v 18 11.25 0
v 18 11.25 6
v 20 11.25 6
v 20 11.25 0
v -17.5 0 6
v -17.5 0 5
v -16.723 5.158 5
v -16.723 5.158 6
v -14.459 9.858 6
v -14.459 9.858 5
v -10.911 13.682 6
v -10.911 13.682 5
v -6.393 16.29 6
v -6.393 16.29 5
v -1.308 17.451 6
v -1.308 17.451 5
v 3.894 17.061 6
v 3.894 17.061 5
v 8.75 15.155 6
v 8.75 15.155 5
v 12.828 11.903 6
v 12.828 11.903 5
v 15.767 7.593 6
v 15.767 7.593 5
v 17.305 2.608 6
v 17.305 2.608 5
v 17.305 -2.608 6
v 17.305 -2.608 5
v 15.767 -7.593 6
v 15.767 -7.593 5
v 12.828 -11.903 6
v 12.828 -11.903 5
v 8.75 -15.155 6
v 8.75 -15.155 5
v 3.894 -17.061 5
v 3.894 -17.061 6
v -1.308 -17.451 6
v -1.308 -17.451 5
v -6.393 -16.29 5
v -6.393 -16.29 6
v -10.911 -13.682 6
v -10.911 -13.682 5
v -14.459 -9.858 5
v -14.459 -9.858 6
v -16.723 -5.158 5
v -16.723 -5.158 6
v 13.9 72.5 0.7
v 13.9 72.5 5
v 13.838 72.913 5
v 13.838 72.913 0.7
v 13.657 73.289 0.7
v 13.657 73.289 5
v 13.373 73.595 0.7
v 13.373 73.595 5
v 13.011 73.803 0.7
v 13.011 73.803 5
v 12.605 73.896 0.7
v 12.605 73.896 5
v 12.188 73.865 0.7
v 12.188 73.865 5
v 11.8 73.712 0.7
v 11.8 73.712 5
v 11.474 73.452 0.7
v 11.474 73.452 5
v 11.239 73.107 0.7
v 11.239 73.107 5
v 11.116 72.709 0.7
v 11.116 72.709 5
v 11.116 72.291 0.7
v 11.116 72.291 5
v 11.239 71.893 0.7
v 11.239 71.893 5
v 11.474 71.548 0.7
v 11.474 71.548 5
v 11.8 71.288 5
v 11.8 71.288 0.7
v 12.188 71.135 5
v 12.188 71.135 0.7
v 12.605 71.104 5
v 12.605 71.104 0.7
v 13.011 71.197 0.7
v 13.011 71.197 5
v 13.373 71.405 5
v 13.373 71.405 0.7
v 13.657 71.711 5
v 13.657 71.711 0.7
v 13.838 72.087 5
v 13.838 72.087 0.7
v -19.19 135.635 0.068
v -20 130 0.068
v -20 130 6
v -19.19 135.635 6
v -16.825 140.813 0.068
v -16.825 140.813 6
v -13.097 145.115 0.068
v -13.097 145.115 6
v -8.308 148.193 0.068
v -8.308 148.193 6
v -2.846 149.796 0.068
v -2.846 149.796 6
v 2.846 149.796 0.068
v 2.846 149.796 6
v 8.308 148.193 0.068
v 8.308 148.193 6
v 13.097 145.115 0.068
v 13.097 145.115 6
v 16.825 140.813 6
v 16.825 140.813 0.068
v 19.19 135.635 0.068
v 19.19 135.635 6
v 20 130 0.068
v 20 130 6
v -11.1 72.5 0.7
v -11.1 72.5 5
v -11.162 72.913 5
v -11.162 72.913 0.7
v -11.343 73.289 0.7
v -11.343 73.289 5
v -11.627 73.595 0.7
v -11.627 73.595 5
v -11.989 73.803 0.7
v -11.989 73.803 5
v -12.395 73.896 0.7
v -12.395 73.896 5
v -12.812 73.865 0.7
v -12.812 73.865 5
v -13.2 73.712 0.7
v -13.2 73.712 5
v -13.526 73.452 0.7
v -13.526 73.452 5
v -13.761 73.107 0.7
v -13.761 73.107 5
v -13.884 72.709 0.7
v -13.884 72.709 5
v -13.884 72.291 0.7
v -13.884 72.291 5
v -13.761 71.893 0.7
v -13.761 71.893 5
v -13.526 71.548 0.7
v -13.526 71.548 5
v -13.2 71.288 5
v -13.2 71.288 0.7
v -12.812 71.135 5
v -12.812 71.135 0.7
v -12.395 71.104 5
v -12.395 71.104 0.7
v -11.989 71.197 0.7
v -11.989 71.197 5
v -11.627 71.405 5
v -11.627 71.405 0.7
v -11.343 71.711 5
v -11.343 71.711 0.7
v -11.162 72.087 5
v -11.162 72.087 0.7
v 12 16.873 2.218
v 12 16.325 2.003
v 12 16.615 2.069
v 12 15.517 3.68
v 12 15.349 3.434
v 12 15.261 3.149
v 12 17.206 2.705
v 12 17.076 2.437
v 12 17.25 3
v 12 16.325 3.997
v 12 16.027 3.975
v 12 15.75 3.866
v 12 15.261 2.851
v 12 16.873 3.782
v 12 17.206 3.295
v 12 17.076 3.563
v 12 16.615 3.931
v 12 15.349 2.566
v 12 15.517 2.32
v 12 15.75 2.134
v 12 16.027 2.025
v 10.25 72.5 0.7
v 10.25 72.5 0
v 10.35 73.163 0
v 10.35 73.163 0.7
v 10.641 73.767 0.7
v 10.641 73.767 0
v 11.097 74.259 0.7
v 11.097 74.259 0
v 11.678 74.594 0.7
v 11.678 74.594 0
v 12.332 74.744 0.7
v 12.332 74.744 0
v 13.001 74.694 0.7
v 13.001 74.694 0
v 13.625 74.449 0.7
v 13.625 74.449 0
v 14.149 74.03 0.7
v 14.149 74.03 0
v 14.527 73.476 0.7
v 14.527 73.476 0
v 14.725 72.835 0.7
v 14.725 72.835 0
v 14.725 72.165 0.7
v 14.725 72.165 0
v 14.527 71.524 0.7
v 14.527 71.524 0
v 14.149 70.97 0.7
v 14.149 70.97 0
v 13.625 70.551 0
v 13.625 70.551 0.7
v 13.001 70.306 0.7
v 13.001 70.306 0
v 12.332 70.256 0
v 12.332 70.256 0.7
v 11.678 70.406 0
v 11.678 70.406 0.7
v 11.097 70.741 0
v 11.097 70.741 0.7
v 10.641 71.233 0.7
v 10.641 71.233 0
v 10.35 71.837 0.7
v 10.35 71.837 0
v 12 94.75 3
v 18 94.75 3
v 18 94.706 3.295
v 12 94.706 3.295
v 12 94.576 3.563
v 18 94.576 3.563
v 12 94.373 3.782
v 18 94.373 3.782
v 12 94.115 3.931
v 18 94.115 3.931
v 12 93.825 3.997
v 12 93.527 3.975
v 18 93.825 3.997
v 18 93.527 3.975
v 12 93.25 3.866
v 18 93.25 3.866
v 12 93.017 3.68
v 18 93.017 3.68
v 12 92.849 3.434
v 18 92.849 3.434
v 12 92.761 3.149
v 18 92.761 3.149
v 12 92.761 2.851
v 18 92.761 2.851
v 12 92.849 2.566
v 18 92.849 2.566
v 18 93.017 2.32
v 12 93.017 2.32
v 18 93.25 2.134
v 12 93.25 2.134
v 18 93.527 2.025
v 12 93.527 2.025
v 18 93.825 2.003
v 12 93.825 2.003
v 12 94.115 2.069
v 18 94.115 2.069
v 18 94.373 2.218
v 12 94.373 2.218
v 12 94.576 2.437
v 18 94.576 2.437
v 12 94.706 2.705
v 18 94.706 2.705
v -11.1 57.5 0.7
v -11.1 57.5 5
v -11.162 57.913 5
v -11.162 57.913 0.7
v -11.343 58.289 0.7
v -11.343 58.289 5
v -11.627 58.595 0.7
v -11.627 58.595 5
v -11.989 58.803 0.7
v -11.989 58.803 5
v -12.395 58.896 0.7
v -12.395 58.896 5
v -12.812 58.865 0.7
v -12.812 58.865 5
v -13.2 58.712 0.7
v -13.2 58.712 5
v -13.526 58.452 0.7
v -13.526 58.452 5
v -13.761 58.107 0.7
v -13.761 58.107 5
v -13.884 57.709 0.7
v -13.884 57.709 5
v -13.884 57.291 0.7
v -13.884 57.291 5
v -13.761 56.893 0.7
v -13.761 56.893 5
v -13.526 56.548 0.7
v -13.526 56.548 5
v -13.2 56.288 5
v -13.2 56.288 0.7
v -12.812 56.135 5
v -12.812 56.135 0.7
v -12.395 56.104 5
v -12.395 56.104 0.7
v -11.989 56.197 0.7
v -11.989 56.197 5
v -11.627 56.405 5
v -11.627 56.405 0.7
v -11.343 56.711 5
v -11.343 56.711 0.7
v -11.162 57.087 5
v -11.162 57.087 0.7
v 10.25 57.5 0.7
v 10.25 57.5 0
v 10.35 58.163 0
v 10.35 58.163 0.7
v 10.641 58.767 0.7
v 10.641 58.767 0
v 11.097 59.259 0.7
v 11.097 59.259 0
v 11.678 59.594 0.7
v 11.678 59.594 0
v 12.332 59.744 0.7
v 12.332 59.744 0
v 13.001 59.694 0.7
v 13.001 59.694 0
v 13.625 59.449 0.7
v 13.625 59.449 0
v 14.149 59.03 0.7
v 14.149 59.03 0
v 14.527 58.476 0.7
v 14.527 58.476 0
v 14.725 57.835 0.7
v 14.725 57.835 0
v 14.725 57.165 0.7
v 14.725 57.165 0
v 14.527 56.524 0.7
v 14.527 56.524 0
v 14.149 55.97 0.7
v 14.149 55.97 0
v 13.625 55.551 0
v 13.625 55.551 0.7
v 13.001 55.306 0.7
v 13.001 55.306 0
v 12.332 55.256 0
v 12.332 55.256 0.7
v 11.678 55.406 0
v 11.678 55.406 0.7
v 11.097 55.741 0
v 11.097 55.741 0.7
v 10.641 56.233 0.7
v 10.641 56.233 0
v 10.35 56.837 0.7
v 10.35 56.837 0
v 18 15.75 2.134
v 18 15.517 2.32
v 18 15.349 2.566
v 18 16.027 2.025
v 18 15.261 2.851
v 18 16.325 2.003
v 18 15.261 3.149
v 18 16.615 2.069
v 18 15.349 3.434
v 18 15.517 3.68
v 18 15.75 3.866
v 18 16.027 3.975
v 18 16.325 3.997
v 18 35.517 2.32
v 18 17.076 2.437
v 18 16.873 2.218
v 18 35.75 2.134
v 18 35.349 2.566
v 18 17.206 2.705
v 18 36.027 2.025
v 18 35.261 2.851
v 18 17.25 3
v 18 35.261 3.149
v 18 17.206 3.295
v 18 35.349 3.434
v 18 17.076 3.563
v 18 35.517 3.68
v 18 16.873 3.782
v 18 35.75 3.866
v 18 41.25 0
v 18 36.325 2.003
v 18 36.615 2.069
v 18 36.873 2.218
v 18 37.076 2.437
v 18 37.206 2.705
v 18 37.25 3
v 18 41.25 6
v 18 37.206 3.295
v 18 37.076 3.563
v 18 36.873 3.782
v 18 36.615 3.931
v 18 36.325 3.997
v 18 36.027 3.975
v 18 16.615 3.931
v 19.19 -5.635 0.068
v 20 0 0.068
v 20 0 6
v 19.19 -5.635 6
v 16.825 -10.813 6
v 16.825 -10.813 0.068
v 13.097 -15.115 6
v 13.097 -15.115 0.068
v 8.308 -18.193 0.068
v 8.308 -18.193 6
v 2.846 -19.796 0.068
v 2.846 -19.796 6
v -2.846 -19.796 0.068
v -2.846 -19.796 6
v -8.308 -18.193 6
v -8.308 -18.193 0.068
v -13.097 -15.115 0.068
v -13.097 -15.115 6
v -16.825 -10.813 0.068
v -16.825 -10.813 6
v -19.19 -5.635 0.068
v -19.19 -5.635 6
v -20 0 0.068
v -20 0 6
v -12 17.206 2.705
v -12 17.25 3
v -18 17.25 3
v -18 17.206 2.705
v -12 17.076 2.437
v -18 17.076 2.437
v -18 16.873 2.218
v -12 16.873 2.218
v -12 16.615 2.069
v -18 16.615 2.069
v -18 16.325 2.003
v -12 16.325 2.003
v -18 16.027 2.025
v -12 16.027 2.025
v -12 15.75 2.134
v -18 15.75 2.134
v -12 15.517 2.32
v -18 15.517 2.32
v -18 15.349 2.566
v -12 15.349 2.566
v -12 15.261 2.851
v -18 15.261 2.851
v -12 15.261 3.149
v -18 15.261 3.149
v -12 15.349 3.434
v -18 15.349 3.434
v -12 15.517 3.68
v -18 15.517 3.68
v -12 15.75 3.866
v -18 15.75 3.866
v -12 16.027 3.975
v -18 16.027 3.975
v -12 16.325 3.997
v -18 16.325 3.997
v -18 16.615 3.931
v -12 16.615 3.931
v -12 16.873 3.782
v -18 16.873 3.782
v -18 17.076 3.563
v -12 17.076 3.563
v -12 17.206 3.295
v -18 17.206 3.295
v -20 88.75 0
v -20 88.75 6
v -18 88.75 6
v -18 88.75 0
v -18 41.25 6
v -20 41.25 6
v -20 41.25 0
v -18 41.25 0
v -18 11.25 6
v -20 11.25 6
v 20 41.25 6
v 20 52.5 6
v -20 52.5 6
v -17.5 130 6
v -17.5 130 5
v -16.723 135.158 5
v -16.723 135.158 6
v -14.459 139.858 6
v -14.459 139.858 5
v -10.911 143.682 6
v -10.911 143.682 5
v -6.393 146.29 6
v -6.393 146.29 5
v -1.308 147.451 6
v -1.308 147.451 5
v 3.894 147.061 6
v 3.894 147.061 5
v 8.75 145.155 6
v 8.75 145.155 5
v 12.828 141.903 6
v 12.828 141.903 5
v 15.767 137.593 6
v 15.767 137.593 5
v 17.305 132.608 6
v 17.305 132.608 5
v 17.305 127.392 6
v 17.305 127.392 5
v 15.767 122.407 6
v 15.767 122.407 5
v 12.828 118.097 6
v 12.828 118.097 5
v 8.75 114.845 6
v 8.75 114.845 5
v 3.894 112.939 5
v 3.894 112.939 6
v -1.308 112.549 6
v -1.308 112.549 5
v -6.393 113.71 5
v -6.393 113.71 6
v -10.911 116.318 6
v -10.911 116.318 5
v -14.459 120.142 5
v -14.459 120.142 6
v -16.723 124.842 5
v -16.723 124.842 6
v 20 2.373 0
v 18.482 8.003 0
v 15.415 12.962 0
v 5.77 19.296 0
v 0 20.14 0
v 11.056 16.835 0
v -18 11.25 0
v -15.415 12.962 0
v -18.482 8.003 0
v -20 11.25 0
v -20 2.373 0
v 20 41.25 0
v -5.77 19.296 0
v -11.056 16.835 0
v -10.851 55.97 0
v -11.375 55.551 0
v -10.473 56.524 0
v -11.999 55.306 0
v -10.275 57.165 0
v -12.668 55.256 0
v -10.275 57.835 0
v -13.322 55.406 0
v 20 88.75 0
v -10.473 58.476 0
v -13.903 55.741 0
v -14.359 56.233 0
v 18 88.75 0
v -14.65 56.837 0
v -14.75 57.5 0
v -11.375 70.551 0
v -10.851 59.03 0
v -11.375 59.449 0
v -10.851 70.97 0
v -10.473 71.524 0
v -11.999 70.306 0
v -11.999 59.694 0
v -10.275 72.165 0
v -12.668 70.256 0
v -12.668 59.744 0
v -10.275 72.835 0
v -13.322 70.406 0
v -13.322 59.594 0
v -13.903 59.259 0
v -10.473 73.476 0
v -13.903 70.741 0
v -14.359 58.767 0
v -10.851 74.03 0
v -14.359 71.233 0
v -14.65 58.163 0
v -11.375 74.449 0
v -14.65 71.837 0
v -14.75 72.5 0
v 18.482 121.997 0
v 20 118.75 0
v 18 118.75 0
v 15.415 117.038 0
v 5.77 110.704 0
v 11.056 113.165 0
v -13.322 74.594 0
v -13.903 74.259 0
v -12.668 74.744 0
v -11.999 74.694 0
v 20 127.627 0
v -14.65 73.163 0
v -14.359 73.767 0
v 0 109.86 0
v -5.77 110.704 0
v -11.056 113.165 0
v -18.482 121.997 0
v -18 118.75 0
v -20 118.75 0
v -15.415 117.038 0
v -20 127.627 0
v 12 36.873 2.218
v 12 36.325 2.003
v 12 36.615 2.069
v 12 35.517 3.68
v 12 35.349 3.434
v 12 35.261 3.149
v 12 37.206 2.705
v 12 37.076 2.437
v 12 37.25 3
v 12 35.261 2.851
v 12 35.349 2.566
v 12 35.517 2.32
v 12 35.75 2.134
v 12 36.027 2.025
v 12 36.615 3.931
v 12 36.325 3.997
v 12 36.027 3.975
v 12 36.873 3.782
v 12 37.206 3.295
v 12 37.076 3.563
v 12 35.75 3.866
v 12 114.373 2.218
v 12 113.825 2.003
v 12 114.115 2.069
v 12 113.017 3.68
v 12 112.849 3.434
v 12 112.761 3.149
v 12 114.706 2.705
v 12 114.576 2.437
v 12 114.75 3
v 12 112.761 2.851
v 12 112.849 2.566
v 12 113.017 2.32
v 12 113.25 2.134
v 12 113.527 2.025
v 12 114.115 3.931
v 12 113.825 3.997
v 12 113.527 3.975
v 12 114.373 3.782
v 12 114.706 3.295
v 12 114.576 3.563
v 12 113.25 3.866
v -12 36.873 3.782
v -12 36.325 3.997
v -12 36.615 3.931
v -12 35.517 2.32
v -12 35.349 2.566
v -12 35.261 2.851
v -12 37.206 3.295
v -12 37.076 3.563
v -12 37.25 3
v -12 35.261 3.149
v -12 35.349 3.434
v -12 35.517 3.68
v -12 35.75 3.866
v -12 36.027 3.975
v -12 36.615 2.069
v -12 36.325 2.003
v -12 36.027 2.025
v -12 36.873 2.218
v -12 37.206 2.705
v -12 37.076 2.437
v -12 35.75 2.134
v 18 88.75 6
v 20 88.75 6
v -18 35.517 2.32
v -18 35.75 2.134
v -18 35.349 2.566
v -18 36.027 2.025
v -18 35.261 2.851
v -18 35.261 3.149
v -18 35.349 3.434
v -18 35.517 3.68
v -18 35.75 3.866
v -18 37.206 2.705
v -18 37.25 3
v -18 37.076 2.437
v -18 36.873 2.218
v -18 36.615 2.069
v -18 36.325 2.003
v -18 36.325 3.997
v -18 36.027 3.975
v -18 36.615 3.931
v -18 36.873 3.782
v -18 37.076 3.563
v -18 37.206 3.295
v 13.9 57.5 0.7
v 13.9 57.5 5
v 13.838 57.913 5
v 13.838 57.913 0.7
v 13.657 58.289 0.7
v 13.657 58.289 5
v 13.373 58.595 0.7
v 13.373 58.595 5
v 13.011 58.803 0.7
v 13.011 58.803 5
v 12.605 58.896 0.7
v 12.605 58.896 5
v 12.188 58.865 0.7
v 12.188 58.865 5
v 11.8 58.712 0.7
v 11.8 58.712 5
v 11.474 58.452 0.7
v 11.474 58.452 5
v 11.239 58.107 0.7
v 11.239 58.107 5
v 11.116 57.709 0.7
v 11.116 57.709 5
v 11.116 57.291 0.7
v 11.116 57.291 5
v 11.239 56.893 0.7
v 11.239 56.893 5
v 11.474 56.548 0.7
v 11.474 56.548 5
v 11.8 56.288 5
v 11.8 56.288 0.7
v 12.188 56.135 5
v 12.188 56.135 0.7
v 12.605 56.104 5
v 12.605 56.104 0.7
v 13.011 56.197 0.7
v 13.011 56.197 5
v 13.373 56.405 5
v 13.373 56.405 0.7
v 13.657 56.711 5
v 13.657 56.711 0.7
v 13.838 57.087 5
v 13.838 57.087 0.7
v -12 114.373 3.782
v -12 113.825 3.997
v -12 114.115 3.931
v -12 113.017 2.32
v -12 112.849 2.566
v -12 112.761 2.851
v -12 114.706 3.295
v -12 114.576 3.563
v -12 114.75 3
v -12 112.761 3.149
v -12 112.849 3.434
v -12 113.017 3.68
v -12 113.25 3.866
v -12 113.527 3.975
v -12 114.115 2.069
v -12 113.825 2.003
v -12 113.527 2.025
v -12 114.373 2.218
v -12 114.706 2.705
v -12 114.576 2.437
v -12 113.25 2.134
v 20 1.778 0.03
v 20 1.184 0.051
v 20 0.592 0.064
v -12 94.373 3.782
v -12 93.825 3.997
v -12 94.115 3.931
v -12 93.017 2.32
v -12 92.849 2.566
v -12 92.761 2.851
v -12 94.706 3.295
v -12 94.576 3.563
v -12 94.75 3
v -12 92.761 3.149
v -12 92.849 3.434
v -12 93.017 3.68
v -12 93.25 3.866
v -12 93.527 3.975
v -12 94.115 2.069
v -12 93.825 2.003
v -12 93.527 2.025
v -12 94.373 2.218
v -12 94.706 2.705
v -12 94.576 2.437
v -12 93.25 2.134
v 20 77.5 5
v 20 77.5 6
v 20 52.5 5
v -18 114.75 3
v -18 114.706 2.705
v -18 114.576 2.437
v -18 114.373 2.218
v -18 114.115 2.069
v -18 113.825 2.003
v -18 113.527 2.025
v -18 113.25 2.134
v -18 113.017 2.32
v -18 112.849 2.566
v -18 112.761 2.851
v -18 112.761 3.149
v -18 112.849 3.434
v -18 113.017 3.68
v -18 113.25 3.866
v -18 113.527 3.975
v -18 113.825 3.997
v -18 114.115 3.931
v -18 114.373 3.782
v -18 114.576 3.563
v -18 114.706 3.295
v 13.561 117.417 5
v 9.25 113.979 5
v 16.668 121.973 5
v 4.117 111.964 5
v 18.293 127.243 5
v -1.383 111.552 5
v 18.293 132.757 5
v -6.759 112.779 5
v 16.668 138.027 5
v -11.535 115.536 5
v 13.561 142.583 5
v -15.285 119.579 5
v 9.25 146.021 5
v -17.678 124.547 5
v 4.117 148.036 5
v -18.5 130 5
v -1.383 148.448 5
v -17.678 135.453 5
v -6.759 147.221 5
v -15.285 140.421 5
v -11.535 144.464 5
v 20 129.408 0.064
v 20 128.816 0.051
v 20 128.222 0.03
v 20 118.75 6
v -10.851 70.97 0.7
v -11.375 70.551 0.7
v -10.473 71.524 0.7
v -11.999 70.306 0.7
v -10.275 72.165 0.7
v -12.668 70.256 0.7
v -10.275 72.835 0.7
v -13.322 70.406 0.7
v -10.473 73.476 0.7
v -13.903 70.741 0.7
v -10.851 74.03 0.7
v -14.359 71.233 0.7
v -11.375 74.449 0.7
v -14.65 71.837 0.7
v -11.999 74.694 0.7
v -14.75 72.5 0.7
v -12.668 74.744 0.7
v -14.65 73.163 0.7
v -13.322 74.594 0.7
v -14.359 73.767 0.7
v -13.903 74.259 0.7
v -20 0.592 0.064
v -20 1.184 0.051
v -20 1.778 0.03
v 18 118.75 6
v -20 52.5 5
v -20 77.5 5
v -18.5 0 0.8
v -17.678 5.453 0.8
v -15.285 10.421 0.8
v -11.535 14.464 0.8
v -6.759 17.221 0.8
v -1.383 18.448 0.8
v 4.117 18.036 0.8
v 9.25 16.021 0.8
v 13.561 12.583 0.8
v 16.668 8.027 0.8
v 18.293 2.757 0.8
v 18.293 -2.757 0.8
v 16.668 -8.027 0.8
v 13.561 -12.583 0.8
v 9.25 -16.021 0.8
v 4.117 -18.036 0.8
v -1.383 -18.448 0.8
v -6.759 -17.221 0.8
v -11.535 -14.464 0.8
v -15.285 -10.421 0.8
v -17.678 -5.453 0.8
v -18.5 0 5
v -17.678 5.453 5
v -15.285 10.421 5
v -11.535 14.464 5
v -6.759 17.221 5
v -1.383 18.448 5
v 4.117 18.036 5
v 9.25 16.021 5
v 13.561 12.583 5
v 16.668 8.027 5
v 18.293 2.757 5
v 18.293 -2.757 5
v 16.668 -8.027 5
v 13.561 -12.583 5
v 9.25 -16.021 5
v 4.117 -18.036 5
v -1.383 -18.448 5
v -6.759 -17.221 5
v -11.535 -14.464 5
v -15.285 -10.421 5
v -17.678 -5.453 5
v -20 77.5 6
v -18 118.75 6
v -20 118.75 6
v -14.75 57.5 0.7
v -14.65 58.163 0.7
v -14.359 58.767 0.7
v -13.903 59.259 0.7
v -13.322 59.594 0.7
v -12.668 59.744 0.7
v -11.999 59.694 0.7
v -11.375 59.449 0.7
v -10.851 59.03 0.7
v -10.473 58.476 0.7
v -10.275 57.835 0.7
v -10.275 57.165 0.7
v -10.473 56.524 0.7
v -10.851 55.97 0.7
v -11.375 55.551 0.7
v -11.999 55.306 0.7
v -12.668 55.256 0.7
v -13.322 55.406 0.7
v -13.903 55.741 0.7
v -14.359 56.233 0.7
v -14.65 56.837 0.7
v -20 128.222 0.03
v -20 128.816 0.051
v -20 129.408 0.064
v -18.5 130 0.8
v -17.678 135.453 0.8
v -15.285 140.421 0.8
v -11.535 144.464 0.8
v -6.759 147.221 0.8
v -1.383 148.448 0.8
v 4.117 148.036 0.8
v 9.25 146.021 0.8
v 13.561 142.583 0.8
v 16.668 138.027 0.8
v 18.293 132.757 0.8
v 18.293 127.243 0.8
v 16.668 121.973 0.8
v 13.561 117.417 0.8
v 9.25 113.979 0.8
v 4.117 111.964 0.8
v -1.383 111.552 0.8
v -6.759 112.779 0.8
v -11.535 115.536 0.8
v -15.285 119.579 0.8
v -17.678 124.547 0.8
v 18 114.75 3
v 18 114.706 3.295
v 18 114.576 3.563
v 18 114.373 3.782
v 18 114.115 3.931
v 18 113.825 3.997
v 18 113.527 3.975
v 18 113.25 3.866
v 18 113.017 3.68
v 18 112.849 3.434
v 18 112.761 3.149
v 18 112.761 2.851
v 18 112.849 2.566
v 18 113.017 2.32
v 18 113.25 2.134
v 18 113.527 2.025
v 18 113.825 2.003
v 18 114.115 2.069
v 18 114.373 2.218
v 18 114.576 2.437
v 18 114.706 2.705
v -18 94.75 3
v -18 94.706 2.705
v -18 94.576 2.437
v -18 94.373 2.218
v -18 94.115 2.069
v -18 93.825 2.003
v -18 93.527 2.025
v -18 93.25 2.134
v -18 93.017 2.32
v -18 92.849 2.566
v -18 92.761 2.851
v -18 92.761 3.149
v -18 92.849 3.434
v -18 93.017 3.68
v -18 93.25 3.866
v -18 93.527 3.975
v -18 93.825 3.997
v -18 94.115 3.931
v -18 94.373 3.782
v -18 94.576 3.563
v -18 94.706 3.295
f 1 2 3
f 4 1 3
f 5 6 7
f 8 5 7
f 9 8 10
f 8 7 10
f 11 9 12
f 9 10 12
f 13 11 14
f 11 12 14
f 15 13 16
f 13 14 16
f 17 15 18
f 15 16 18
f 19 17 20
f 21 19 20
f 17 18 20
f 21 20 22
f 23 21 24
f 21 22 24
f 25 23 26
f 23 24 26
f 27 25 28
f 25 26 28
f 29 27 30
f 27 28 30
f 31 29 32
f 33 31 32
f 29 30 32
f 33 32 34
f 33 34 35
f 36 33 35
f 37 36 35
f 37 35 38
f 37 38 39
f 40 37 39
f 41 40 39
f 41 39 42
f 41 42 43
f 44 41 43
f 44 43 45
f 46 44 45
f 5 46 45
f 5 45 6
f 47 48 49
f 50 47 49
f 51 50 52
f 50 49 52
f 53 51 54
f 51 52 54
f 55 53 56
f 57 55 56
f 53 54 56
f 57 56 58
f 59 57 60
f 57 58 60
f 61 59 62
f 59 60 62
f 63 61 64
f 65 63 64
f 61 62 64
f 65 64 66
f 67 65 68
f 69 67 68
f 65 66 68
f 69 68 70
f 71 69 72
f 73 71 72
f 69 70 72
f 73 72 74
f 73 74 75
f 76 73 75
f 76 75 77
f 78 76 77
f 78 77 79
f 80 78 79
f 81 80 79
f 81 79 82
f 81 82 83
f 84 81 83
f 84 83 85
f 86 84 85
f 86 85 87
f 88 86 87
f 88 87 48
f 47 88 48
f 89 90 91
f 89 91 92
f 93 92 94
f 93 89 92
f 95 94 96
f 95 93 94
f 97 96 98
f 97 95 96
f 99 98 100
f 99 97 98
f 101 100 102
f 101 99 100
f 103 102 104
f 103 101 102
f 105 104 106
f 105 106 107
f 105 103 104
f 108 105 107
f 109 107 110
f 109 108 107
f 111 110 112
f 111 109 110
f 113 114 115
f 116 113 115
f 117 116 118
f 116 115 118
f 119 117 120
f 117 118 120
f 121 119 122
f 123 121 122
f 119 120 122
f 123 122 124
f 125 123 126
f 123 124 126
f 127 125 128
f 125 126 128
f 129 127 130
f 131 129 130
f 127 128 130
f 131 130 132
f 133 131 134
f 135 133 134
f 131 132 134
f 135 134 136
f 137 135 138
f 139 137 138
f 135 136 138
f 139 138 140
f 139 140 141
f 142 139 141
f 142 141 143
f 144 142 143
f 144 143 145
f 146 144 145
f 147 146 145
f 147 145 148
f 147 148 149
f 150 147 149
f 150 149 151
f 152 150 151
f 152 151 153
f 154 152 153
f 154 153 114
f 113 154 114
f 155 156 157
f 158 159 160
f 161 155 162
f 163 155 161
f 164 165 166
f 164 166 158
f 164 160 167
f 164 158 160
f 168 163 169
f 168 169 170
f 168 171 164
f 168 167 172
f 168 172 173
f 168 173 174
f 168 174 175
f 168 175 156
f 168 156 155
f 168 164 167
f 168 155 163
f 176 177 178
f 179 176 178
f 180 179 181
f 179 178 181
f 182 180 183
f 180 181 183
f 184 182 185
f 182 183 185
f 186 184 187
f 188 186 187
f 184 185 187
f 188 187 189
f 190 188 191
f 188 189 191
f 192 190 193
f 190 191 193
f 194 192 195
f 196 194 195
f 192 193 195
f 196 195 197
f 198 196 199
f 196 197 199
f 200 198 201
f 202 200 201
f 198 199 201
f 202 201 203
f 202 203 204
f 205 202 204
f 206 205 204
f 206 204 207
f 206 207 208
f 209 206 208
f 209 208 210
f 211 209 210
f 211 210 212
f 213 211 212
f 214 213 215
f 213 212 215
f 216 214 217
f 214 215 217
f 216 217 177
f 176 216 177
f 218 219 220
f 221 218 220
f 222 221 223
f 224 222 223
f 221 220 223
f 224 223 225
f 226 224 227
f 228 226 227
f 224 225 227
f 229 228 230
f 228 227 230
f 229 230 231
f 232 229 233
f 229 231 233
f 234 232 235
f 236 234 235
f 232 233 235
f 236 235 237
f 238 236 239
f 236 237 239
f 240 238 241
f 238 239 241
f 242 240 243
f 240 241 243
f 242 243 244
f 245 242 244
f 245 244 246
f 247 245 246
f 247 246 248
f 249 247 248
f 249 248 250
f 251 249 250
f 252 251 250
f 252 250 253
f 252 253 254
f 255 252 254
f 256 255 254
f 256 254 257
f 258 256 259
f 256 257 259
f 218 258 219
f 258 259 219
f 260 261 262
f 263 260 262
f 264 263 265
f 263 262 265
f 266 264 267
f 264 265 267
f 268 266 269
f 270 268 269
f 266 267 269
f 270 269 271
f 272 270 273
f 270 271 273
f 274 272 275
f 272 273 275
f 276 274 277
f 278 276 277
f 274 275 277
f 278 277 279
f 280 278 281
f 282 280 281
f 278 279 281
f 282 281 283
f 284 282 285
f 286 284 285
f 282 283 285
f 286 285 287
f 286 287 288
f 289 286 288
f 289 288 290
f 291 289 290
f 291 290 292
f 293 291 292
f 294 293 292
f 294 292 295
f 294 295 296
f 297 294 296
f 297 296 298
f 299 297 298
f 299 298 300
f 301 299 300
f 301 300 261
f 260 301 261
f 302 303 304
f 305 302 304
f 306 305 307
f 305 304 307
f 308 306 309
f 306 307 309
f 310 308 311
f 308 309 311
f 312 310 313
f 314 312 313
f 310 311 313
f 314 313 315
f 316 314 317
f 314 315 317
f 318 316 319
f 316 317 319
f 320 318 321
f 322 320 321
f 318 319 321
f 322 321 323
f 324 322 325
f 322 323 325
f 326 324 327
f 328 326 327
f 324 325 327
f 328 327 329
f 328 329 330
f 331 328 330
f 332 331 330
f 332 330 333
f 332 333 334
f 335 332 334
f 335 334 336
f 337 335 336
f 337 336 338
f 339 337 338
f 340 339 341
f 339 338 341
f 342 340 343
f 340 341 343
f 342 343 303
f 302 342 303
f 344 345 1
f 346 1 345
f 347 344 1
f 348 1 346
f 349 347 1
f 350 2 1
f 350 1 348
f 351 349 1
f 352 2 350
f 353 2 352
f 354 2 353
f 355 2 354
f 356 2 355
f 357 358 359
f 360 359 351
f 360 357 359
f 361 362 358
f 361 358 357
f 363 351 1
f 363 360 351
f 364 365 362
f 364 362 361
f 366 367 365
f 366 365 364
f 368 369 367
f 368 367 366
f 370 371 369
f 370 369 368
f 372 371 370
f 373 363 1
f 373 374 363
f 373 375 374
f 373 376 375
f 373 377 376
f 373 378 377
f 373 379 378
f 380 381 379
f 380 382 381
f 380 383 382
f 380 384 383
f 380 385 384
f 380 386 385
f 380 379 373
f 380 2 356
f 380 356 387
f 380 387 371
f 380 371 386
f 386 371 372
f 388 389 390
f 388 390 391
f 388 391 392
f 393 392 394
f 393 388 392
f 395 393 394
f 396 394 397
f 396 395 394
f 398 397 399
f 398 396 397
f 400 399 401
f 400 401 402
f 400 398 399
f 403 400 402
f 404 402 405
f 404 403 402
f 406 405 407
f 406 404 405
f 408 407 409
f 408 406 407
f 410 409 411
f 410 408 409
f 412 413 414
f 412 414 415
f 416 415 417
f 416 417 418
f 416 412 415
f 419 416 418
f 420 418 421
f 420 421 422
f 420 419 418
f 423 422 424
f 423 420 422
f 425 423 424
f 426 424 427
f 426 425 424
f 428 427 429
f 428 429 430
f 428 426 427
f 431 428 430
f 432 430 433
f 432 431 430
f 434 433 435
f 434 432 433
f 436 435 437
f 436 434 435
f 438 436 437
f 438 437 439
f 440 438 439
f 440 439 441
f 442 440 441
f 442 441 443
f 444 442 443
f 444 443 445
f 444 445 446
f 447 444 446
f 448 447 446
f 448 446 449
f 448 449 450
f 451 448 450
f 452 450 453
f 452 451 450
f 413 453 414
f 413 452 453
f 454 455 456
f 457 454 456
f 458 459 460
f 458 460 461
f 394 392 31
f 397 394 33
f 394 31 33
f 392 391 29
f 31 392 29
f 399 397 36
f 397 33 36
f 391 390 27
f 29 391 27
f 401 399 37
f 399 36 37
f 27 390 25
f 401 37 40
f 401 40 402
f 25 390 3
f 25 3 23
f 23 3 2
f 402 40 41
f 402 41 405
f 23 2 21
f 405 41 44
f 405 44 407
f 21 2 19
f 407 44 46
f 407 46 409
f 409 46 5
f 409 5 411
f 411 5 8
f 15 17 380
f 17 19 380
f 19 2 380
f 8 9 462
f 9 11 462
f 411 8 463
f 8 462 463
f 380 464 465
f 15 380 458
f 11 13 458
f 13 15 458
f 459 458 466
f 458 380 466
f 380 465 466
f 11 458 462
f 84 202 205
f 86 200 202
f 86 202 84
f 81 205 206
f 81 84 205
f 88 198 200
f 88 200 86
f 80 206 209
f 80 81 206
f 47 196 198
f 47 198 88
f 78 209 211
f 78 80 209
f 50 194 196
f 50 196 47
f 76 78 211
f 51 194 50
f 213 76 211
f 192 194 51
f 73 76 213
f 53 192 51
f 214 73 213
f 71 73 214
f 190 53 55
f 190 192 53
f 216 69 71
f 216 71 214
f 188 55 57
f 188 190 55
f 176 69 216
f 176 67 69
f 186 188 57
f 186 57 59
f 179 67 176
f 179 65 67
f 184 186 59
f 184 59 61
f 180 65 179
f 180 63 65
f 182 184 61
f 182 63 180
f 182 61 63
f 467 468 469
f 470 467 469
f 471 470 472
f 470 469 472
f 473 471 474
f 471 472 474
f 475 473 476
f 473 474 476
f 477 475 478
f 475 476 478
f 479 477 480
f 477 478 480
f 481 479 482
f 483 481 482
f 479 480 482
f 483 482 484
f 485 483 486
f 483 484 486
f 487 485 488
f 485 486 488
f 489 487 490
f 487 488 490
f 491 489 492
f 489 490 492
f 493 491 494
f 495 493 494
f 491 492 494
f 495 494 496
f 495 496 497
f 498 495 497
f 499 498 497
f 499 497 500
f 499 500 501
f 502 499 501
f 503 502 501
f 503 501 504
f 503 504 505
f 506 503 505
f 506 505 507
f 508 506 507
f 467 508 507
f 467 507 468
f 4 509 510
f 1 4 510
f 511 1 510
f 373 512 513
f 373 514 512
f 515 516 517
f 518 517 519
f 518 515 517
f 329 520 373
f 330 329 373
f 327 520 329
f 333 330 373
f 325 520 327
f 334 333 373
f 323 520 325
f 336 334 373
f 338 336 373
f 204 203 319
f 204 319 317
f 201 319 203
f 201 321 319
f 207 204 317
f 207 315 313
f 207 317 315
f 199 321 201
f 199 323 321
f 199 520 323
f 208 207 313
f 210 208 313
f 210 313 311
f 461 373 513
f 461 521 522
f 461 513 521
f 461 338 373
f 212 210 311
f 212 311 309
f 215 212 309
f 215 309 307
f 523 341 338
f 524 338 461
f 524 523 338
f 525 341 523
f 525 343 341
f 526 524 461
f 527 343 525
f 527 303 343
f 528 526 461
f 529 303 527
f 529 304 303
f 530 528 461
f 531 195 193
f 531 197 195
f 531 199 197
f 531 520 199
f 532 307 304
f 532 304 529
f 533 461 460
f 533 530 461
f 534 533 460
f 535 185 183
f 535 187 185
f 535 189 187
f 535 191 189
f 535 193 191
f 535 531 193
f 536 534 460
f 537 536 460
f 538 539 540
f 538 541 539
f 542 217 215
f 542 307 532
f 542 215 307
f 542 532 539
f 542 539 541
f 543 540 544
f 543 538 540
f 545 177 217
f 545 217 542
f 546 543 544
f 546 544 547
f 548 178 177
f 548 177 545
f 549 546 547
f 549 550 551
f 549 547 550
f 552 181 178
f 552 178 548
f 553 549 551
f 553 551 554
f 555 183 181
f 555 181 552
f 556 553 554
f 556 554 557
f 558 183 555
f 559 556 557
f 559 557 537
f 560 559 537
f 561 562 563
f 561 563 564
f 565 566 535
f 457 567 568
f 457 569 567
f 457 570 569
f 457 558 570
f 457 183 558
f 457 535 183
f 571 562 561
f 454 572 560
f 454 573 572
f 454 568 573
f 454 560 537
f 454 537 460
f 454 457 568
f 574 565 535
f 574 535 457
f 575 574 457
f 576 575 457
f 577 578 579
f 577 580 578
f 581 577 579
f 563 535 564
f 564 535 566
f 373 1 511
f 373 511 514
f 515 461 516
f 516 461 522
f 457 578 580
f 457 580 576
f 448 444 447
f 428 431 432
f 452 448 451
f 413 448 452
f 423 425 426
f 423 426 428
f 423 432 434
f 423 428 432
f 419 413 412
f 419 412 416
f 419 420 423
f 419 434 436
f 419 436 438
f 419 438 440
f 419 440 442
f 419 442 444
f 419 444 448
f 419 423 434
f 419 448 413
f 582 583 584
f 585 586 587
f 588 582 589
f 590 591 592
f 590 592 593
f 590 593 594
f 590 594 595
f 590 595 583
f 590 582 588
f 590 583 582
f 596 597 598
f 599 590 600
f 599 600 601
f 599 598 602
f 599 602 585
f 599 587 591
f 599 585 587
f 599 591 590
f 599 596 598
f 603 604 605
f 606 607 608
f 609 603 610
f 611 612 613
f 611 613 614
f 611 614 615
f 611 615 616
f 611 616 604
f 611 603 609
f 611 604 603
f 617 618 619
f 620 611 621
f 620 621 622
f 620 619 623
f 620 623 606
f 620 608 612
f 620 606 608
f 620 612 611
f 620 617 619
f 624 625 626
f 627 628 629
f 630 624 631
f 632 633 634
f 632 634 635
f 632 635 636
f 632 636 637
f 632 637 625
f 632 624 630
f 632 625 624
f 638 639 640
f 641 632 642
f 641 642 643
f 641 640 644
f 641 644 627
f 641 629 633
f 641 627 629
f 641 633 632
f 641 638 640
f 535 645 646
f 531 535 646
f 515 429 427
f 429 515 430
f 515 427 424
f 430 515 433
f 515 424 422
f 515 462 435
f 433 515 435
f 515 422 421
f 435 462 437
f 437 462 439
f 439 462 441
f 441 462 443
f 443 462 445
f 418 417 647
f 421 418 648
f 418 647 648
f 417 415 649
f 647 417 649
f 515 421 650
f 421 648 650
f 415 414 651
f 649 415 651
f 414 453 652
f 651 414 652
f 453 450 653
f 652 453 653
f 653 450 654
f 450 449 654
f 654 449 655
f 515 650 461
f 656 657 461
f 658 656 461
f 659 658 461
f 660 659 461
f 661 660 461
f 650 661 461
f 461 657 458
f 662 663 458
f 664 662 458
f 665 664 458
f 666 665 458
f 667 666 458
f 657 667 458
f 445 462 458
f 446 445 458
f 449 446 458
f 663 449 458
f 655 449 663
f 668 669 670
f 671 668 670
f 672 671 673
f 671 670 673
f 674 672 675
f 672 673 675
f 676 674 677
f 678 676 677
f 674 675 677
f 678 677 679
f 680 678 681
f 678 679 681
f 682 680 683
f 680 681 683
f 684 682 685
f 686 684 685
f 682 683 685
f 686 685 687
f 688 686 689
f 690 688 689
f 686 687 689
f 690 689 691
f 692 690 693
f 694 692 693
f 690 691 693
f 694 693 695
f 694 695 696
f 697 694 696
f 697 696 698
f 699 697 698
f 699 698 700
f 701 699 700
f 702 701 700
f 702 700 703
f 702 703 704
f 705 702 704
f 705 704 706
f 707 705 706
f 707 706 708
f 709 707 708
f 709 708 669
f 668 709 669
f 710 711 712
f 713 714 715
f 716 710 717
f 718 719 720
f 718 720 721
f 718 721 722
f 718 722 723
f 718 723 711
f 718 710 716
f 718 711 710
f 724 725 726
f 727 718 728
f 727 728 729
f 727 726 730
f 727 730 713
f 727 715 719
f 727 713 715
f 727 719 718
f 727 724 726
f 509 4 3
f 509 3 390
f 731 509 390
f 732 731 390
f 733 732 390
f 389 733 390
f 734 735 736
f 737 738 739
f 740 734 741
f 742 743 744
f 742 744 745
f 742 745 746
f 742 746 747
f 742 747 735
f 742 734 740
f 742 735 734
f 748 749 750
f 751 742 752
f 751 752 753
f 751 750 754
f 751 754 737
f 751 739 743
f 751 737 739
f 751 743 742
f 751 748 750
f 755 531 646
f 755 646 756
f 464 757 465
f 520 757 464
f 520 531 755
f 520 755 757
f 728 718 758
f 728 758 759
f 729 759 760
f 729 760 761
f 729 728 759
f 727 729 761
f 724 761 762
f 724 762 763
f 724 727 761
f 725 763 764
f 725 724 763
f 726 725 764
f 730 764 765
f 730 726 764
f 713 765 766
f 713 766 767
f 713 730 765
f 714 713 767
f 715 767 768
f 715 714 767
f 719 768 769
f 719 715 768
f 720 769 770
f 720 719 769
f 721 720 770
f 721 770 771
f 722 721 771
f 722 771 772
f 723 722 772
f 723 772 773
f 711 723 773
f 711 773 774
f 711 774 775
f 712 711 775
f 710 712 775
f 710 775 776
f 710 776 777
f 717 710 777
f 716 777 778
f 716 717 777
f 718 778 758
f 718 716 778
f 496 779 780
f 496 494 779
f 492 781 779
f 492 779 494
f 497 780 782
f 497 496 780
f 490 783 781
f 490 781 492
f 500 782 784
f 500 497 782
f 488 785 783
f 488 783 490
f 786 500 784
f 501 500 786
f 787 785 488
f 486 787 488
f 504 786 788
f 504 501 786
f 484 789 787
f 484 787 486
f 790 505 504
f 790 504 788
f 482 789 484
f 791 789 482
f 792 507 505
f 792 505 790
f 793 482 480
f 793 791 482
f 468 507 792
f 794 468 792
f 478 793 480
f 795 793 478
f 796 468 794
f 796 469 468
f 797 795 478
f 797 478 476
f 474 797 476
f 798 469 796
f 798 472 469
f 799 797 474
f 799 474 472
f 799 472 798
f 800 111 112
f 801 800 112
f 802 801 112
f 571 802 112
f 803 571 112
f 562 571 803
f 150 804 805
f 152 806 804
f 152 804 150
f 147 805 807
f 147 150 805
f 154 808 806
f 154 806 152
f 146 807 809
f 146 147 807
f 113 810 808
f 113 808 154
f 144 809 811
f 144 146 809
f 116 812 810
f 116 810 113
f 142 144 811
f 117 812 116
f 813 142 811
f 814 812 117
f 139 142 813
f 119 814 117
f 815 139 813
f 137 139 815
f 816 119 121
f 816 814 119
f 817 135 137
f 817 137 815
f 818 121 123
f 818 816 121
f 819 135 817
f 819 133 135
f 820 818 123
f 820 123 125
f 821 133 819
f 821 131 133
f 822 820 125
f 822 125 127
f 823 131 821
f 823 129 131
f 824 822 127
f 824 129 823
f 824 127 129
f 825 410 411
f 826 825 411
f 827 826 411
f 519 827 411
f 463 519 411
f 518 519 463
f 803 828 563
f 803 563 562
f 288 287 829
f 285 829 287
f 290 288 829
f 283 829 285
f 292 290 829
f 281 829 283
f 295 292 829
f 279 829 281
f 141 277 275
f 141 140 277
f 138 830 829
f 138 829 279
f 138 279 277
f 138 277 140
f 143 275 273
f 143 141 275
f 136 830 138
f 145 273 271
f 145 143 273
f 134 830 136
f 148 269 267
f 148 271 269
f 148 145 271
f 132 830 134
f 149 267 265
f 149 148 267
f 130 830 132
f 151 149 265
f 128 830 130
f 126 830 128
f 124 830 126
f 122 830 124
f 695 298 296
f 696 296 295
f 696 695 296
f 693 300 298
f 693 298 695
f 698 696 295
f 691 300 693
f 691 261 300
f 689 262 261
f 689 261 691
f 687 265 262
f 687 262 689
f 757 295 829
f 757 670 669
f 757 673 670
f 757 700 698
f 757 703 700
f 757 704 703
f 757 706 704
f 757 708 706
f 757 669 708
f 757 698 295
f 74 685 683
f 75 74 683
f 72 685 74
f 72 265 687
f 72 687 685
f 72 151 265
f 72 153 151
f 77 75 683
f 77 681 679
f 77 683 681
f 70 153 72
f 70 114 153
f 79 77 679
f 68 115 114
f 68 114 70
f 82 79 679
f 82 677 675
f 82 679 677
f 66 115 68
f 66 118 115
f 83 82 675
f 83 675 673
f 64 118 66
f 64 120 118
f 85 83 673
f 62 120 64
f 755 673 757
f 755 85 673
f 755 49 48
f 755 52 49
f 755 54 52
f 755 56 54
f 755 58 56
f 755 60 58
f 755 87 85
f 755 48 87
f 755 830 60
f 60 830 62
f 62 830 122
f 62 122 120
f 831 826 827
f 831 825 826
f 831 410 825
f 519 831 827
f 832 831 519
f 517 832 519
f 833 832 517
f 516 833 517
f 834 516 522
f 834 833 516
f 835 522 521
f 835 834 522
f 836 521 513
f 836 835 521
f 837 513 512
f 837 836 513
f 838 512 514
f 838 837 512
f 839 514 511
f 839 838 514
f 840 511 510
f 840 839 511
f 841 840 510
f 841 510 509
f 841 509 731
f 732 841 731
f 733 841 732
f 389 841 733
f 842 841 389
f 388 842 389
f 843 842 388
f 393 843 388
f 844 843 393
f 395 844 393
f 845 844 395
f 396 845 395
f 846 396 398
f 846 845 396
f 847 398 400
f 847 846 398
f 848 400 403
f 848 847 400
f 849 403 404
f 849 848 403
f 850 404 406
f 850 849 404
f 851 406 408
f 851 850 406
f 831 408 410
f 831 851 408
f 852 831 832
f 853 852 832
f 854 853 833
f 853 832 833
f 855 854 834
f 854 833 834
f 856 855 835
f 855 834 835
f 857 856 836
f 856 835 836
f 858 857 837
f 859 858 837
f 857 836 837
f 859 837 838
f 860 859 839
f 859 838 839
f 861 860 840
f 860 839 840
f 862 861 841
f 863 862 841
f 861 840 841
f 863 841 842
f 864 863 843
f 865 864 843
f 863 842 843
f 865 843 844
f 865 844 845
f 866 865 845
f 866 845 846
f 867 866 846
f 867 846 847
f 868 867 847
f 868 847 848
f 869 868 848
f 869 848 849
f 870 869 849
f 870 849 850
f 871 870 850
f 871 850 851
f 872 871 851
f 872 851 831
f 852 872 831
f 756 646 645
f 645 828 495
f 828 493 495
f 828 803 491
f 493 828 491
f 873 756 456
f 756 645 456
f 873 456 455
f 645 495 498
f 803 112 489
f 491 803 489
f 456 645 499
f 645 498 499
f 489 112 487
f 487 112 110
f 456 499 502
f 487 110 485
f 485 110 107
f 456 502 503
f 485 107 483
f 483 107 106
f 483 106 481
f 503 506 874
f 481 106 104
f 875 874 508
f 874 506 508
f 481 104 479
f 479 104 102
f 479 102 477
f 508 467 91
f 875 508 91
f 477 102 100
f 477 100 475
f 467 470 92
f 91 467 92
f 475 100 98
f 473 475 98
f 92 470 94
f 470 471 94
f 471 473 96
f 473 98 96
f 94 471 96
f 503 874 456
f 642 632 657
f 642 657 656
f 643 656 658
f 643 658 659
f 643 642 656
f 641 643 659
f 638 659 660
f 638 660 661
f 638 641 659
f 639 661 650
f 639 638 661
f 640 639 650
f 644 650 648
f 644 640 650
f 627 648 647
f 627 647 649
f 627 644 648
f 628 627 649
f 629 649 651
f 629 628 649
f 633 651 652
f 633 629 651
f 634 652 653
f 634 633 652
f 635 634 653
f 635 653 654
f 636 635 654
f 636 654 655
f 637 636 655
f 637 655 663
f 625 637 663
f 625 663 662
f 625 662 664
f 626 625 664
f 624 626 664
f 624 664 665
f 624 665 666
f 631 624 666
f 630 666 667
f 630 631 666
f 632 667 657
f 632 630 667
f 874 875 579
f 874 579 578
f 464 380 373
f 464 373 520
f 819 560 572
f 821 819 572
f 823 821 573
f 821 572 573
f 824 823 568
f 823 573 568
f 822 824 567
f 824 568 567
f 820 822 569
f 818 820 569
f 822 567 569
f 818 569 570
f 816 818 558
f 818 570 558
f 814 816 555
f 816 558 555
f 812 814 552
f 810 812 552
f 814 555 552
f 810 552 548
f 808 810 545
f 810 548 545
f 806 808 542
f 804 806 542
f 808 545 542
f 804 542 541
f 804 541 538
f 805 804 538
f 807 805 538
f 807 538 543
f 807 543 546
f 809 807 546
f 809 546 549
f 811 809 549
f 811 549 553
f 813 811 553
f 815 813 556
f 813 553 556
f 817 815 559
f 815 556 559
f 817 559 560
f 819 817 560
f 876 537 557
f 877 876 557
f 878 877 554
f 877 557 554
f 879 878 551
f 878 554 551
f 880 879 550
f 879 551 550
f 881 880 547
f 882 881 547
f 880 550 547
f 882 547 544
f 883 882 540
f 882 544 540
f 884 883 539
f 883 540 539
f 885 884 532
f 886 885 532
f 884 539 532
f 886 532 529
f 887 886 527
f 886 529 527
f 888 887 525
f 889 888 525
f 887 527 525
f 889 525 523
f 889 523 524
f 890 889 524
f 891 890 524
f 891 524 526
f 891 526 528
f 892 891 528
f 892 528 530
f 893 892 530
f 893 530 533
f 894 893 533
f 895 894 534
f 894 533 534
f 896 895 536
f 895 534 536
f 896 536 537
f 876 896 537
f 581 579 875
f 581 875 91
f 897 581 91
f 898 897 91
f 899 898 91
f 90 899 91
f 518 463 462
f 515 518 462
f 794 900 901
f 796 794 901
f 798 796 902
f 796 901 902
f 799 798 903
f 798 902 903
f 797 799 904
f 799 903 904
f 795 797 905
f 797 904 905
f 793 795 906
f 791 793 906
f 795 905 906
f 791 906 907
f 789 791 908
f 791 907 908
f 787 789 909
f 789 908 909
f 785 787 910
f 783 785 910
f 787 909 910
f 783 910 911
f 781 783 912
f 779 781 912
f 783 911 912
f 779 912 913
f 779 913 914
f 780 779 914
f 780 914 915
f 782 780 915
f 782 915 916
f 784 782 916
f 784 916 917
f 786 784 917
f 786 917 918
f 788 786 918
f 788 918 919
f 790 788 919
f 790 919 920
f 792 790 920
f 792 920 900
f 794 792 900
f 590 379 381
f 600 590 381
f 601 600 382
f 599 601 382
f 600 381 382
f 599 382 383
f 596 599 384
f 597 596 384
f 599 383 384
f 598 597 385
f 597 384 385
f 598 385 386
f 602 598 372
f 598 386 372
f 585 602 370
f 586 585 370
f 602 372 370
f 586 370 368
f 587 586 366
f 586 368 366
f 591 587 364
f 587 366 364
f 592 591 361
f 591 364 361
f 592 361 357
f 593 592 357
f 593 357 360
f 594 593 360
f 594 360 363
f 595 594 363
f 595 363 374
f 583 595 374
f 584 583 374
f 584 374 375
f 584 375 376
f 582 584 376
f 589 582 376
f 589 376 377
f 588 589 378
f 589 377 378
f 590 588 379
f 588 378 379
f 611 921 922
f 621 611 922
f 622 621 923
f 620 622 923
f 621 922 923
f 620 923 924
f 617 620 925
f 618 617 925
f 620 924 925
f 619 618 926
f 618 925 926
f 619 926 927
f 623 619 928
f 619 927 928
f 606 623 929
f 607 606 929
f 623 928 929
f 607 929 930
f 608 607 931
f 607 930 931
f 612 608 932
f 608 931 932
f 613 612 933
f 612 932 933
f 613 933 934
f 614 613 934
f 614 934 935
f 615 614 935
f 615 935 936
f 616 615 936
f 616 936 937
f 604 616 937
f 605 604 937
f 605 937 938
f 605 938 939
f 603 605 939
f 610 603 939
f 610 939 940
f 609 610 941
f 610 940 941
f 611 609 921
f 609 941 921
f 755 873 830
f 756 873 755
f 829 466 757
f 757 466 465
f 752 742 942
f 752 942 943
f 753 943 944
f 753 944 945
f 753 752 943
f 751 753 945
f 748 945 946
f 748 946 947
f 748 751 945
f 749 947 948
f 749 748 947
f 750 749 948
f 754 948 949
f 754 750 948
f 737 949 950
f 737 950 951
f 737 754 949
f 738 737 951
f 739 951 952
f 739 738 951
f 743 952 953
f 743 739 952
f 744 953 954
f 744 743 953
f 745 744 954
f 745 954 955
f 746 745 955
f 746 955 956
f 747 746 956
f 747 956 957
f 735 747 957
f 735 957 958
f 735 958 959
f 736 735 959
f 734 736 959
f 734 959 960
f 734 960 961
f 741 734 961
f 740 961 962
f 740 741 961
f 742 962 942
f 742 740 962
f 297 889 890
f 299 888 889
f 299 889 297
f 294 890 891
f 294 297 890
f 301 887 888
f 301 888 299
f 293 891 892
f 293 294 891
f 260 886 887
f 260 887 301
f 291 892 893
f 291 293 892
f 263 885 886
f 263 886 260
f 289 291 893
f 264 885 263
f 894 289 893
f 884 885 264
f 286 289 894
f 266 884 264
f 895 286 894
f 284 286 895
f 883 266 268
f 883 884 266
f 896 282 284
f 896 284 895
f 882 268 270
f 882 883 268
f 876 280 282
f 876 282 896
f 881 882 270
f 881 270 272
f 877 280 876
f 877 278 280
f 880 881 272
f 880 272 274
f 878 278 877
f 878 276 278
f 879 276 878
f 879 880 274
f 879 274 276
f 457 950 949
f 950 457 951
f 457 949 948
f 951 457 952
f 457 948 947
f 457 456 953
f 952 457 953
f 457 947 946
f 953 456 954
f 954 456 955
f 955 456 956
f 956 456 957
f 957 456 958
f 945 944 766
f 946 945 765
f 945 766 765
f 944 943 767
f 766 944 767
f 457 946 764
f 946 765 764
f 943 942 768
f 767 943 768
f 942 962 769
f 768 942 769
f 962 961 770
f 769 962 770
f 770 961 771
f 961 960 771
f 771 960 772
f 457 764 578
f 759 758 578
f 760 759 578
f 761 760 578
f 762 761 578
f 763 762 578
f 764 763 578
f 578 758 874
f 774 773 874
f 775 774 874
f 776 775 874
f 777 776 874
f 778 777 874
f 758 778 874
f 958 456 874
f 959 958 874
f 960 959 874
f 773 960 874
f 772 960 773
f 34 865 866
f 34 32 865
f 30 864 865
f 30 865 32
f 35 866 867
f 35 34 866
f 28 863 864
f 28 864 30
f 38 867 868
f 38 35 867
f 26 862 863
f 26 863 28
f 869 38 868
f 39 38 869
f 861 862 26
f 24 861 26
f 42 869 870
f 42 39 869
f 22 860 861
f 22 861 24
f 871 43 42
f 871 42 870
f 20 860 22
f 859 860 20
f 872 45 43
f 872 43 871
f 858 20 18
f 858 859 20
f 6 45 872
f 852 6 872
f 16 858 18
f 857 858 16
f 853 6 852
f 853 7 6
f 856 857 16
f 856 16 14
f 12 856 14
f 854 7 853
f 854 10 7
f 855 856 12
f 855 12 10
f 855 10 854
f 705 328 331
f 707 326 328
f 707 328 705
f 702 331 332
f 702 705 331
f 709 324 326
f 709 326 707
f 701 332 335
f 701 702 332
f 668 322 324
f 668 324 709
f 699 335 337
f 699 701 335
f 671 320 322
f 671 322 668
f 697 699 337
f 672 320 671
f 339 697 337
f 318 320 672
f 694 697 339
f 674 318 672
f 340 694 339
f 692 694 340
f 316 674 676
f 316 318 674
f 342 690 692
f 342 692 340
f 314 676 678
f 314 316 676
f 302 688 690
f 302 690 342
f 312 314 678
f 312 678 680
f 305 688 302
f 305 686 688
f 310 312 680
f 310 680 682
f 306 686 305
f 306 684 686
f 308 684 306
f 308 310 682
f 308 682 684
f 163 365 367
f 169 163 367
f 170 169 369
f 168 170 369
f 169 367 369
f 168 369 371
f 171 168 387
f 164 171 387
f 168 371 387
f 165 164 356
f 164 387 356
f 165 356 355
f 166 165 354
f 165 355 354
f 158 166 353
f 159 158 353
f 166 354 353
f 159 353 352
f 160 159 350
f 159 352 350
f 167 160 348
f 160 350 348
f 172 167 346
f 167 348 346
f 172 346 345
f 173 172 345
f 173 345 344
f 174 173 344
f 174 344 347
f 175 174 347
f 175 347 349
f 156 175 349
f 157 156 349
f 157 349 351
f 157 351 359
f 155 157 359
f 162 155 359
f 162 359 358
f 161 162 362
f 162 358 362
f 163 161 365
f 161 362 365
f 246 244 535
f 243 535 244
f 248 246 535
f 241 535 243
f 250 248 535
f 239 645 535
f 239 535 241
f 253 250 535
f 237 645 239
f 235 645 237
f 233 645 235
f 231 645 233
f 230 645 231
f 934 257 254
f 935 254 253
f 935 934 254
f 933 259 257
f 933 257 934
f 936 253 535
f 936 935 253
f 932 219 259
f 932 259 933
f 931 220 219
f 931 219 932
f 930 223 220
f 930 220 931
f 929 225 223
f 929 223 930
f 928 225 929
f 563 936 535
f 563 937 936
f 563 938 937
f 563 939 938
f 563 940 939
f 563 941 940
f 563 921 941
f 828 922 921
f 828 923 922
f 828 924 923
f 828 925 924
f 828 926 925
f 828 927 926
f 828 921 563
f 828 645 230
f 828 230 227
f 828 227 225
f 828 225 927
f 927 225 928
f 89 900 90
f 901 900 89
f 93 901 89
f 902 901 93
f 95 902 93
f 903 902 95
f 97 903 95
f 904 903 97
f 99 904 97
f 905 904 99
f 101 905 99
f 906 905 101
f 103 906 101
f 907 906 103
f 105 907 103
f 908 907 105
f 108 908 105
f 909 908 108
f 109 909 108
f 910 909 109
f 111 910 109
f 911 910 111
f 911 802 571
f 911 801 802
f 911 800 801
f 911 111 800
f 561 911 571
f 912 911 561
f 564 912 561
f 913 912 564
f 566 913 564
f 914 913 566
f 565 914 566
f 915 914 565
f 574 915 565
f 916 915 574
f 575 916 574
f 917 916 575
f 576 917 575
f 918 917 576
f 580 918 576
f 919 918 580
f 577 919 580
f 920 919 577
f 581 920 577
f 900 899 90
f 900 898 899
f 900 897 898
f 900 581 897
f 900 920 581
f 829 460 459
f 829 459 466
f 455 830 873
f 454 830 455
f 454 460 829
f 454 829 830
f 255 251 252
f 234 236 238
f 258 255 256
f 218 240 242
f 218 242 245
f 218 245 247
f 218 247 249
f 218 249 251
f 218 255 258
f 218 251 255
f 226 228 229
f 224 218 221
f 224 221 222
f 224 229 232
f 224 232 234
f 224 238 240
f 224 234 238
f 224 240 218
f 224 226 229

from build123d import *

# Parameters (mm, degrees)
EXTRUDE_1_DEPTH      = 6
SKETCH_2_R           = 18.5
CUT_EXTRUDE_1_DEPTH  = 5
CHAMFER_1_SIZE       = 1.640243073
CHAMFER_1_SIZE_2     = 0.8
SKETCH_18_W          = 40
SKETCH_18_H          = 25
CUT_EXTRUDE_9_DEPTH  = 1
SKETCH_19_R          = 1.4
CUT_EXTRUDE_10_DEPTH = 152.410039297
SKETCH_20_R          = 2.25
CUT_EXTRUDE_11_DEPTH = 0.7
SKETCH_21_W          = 4
SKETCH_21_H          = 30
CUT_EXTRUDE_12_DEPTH = 152.446360141
SKETCH_22_R          = 1
CUT_EXTRUDE_13_DEPTH = 6
CUT_EXTRUDE_START    = -6
SKETCH_23_R          = 1
CUT_EXTRUDE_14_DEPTH = 6
SKETCH_24_R          = 17.5
CUT_EXTRUDE_15_DEPTH = 152.410039297


with BuildPart() as part:
    # 스케치1 → 보스-돌출1 (new body)
    with BuildSketch(Plane.XY):
        with BuildLine():
            Line((-20, 0), (-20, 130))
            ThreePointArc((-20, 130), (0, 150), (20, 130))
            Line((20, 130), (20, 0))
            ThreePointArc((20, 0), (0, -20), (-20, 0))
        make_face()
    extrude(amount=EXTRUDE_1_DEPTH)

    # 스케치2 → 컷-돌출1 (cut)
    with BuildSketch(Plane(origin=(0, 0, 0), x_dir=(-1, 0, 0), z_dir=(0, 0, -1))):
        Circle(SKETCH_2_R)
        with Locations((0, 130)):
            Circle(SKETCH_2_R)
    extrude(amount=-CUT_EXTRUDE_1_DEPTH, mode=Mode.SUBTRACT)

    # 모따기1
    # the kernel refuses this chamfer: 1.640243073, 0.8 mm, written as the material it takes off along each edge
    with BuildSketch(Plane(origin=(0, 130, 0), x_dir=(-1, 0, 0), z_dir=(0, -1, 0))) as chamfer_1_piece_1:
        Polygon((18.5 + CHAMFER_1_SIZE, 0), (18.5, -CHAMFER_1_SIZE_2), (18.5, 0), align=None)
    revolve(axis=Axis((0, 130, 0), (0, 0, -1)), mode=Mode.SUBTRACT)
    with BuildSketch(Plane(origin=(0, 0, 0), x_dir=(-1, 0, 0), z_dir=(0, -1, 0))) as chamfer_1_piece_2:
        Polygon((18.5 + CHAMFER_1_SIZE, 0), (18.5, -CHAMFER_1_SIZE_2), (18.5, 0), align=None)
    revolve(axis=Axis((0, 0, 0), (0, 0, -1)), mode=Mode.SUBTRACT)

    # 스케치18 → 컷-돌출9 (cut)
    with BuildSketch(Plane.XY.offset(6)):
        with Locations((0, 65)):
            Rectangle(SKETCH_18_W, SKETCH_18_H)
    extrude(amount=-CUT_EXTRUDE_9_DEPTH, mode=Mode.SUBTRACT)

    # 스케치19 → 컷-돌출10 (cut, through all)
    with BuildSketch(Plane.XY.offset(5)):
        with Locations((-12.5, 72.5)):
            Circle(SKETCH_19_R)
        with Locations((12.5, 72.5)):
            Circle(SKETCH_19_R)
        with Locations((-12.5, 57.5)):
            Circle(SKETCH_19_R)
        with Locations((12.5, 57.5)):
            Circle(SKETCH_19_R)
    extrude(amount=-CUT_EXTRUDE_10_DEPTH, mode=Mode.SUBTRACT)

    # 스케치20 → 컷-돌출11 (cut)
    with BuildSketch(Plane(origin=(0, 0, 0), x_dir=(-1, 0, 0), z_dir=(0, 0, -1))):
        with Locations((-12.5, 72.5)):
            Circle(SKETCH_20_R)
        with Locations((12.5, 72.5)):
            Circle(SKETCH_20_R)
        with Locations((-12.5, 57.5)):
            Circle(SKETCH_20_R)
        with Locations((12.5, 57.5)):
            Circle(SKETCH_20_R)
    extrude(amount=-CUT_EXTRUDE_11_DEPTH, mode=Mode.SUBTRACT)

    # 스케치21 → 컷-돌출12 (cut, through all)
    with BuildSketch(Plane.XY.offset(6)):
        with Locations((-20, 103.75)):
            Rectangle(SKETCH_21_W, SKETCH_21_H)
        with Locations((20, 103.75)):
            Rectangle(SKETCH_21_W, SKETCH_21_H)
        with Locations((-20, 26.25)):
            Rectangle(SKETCH_21_W, SKETCH_21_H)
        with Locations((20, 26.25)):
            Rectangle(SKETCH_21_W, SKETCH_21_H)
    extrude(amount=-CUT_EXTRUDE_12_DEPTH, mode=Mode.SUBTRACT)

    # 스케치22 → 컷-돌출13 (cut)
    with BuildSketch(Plane(origin=(18, 0, 0), x_dir=(0, 0, -1), z_dir=(1, 0, 0))):
        with Locations(Location((-3, 16.25, 0), (0, 0, 90))):
            Circle(SKETCH_22_R)
        with Locations(Location((-3, 36.25, 0), (0, 0, 90))):
            Circle(SKETCH_22_R)
        with Locations(Location((-3, 113.75, 0), (0, 0, 90))):
            Circle(SKETCH_22_R)
        with Locations(Location((-3, 93.75, 0), (0, 0, 90))):
            Circle(SKETCH_22_R)
    extrude(amount=-CUT_EXTRUDE_13_DEPTH, mode=Mode.SUBTRACT)

    # 스케치23 → 컷-돌출14 (cut)
    with BuildSketch(Plane.ZY.offset(18).offset(CUT_EXTRUDE_START)):
        with Locations(Location((3, 16.25, 0), (0, 0, 90))):
            Circle(SKETCH_23_R)
        with Locations(Location((3, 36.25, 0), (0, 0, 90))):
            Circle(SKETCH_23_R)
        with Locations(Location((3, 113.75, 0), (0, 0, 90))):
            Circle(SKETCH_23_R)
        with Locations(Location((3, 93.75, 0), (0, 0, 90))):
            Circle(SKETCH_23_R)
    extrude(amount=CUT_EXTRUDE_14_DEPTH, mode=Mode.SUBTRACT)

    # 스케치24 → 컷-돌출15 (cut, through all)
    with BuildSketch(Plane(origin=(0, 0, 5), x_dir=(-1, 0, 0), z_dir=(0, 0, -1))):
        with Locations((0, 130)):
            Circle(SKETCH_24_R)
        Circle(SKETCH_24_R)
    extrude(amount=-CUT_EXTRUDE_15_DEPTH, mode=Mode.SUBTRACT)


solid = part.part
